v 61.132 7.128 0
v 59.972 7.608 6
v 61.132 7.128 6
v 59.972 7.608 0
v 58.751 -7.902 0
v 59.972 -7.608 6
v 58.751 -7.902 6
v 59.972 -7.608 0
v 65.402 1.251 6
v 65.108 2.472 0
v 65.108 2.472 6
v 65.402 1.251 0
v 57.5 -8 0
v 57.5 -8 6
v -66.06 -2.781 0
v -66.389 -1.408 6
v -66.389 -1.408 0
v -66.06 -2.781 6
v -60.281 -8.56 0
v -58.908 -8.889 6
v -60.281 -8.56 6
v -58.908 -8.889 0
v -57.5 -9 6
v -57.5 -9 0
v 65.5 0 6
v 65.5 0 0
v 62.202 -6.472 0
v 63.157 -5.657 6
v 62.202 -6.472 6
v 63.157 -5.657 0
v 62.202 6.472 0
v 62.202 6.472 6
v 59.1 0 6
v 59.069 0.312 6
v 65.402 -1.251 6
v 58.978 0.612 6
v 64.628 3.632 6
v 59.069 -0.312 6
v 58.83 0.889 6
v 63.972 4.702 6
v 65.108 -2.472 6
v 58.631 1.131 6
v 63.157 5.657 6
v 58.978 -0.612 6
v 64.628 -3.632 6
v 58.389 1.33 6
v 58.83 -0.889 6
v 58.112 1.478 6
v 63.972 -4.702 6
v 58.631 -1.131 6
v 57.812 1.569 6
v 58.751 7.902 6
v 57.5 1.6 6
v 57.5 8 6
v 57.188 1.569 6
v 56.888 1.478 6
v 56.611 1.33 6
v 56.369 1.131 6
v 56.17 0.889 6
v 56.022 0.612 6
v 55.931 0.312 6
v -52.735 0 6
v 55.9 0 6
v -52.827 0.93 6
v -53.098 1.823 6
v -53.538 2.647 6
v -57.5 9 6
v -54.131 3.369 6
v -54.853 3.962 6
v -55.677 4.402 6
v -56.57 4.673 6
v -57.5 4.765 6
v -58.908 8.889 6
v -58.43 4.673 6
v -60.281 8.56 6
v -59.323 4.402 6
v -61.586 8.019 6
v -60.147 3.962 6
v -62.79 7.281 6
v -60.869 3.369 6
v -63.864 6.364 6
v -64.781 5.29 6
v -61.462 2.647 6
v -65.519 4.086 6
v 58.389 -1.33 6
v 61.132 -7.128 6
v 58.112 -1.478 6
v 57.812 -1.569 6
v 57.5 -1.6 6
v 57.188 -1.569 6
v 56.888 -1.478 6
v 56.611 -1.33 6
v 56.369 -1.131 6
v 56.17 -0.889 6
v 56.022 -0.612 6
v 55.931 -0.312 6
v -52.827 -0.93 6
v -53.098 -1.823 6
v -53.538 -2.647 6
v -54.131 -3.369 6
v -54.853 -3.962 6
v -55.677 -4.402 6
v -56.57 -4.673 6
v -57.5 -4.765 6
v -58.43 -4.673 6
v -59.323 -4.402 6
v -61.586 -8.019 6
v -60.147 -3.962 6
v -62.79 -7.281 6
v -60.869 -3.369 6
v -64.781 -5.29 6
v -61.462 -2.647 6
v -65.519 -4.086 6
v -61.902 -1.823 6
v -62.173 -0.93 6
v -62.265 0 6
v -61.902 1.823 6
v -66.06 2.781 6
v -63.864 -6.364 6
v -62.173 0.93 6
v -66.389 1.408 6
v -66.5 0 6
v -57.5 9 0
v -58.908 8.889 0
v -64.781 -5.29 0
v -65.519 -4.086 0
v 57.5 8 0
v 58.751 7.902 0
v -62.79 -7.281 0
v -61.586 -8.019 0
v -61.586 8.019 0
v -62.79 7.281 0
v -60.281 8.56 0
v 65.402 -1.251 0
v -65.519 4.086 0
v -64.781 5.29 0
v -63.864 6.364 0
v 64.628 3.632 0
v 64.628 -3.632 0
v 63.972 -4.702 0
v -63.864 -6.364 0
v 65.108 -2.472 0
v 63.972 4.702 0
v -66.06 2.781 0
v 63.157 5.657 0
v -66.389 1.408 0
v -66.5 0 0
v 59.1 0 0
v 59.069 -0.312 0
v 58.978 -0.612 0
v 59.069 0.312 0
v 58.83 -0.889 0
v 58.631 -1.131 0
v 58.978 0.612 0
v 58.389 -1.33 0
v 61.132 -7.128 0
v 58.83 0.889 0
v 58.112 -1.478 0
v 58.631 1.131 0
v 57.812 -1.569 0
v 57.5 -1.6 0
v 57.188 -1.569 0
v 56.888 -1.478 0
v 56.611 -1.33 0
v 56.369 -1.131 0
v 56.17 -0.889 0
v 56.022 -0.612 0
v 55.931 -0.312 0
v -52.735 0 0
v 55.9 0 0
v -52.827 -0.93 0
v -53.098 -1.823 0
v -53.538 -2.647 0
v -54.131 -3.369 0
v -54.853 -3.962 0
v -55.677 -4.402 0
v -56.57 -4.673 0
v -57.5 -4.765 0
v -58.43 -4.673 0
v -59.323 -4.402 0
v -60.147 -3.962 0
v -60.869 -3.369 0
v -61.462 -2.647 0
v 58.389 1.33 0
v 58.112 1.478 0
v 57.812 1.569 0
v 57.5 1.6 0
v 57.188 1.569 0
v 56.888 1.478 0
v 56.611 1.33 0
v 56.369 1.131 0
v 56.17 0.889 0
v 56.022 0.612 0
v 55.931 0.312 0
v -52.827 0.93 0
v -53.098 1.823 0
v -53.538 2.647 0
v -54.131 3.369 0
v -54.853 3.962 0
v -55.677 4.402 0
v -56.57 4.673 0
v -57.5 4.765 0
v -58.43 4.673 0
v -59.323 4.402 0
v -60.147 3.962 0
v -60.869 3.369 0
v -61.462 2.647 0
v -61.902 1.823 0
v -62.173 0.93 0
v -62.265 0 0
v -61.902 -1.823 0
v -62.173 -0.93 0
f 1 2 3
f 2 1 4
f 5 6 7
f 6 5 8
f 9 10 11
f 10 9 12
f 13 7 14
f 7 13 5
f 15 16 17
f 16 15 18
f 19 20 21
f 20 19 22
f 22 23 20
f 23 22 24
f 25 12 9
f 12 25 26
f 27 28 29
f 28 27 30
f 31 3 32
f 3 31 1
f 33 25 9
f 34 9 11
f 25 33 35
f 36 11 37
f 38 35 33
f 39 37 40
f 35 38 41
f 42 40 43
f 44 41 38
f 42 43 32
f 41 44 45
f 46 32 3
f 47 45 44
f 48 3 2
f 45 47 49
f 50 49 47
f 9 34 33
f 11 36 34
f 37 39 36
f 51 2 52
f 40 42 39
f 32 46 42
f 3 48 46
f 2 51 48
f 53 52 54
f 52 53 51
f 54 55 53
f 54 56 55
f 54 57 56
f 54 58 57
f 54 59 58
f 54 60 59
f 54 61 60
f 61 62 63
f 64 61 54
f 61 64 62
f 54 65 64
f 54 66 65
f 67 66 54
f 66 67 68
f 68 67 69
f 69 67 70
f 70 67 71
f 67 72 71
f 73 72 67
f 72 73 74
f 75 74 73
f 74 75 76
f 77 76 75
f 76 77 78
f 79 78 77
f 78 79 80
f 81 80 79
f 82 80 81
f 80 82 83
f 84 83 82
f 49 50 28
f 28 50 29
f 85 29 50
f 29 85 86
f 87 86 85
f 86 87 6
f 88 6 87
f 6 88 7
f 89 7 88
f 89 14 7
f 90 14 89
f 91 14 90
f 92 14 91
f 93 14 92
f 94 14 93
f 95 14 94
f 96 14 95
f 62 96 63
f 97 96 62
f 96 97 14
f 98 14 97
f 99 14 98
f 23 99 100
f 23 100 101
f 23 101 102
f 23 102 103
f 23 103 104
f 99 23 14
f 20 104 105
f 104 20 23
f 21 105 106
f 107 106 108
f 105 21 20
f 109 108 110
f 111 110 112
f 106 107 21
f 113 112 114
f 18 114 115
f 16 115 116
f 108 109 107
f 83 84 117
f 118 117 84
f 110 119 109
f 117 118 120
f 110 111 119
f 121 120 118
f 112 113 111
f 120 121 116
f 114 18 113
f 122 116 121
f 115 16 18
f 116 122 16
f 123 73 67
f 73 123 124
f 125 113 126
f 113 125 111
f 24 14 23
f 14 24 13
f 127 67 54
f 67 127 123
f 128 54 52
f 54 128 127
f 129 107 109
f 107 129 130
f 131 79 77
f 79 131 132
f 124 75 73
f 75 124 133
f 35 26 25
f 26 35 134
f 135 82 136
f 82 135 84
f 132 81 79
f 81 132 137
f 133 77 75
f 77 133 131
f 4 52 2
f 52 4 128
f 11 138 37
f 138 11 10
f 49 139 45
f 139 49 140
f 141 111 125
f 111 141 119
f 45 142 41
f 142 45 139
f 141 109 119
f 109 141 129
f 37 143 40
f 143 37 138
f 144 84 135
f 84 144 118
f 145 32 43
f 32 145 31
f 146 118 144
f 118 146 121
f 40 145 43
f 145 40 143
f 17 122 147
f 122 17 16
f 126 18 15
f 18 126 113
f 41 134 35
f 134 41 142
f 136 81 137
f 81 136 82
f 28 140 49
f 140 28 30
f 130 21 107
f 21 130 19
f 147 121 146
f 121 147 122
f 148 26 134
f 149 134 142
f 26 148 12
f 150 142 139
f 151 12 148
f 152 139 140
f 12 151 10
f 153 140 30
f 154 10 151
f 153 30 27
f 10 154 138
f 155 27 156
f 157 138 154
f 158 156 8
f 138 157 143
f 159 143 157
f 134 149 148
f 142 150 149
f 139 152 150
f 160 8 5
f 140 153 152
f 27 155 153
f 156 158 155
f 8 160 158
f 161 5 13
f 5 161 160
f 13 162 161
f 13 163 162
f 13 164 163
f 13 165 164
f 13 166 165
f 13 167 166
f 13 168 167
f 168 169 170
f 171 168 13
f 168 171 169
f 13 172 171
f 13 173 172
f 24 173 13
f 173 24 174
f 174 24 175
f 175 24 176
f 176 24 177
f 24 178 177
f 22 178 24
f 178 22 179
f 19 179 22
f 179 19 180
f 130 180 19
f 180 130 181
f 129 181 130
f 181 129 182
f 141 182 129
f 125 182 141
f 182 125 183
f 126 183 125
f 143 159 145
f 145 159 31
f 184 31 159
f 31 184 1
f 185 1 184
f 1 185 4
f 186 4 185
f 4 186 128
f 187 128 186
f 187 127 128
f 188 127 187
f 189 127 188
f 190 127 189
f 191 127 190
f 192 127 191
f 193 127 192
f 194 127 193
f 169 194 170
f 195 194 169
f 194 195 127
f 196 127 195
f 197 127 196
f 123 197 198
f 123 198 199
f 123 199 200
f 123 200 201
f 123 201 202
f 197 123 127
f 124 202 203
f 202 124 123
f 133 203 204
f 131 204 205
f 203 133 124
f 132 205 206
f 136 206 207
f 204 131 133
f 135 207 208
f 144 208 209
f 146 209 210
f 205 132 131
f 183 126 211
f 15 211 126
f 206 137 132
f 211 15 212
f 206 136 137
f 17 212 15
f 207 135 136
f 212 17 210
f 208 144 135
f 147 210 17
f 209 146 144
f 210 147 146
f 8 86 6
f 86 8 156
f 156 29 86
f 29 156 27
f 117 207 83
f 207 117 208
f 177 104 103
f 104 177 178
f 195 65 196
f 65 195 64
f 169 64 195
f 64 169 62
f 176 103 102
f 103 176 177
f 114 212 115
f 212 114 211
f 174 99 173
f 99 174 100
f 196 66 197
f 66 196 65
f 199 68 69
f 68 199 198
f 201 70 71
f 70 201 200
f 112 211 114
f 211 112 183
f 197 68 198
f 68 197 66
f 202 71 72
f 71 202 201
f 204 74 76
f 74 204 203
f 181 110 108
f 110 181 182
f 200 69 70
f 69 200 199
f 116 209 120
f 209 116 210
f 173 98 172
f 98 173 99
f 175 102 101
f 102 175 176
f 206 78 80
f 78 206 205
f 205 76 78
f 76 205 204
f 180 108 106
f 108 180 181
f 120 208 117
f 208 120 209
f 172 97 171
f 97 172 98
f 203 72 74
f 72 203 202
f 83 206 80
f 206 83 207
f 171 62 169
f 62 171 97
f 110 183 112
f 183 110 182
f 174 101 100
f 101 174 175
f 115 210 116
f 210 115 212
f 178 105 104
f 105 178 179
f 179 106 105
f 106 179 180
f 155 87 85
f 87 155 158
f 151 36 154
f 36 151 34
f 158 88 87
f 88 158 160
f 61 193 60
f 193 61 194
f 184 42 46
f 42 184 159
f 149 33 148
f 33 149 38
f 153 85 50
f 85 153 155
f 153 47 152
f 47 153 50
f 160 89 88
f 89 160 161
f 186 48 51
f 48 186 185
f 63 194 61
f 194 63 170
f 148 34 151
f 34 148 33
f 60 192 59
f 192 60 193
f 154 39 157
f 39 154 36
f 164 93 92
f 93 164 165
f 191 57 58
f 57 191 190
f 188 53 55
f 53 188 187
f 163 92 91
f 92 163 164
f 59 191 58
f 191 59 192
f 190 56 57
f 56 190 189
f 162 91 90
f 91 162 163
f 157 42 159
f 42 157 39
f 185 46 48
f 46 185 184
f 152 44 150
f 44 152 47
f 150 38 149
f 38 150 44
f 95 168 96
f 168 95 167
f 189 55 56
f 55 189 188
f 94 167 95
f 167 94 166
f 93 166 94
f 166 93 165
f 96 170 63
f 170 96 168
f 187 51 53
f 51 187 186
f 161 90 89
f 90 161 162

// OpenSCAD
$fn = 32;

// ----------------------------------------------------------------------
// Lever: 115 mm between the bosses, 6 mm thick, smooth outline
// ----------------------------------------------------------------------

// --- parameters (mm) ---
lever_l = 115;            // distance between the boss centres
boss_a = 18;              // first boss diameter
boss_b = 16;              // second boss diameter
bore_a = 9.53;            // first bore
bore_b = 3.2;             // second bore
lever_t = 6;              // lever thickness

lever_profile = [[-66.5, 0], [-66.389, -1.408], [-66.06, -2.781], [-65.519, -4.086], [-64.781, -5.29], [-63.864, -6.364], [-62.79, -7.281], [-61.586, -8.019], [-60.281, -8.56], [-58.908, -8.889], [-57.5, -9], [57.5, -8], [58.751, -7.902], [59.972, -7.608], [61.132, -7.128], [62.202, -6.472], [63.157, -5.657], [63.972, -4.702], [64.628, -3.632], [65.108, -2.472], [65.402, -1.251], [65.5, 0], [65.402, 1.251], [65.108, 2.472], [64.628, 3.632], [63.972, 4.702], [63.157, 5.657], [62.202, 6.472], [61.132, 7.128], [59.972, 7.608], [58.751, 7.902], [57.5, 8], [-57.5, 9], [-58.908, 8.889], [-60.281, 8.56], [-61.586, 8.019], [-62.79, 7.281], [-63.864, 6.364], [-64.781, 5.29], [-65.519, 4.086], [-66.06, 2.781], [-66.389, 1.408]];

difference() {
  linear_extrude(height = lever_t) polygon(lever_profile);
  translate([-57.5, 0, -2.5]) cylinder(h = lever_t + 5, d = bore_a);
  translate([57.5, 0, -2.5]) cylinder(h = lever_t + 5, d = bore_b);
}
